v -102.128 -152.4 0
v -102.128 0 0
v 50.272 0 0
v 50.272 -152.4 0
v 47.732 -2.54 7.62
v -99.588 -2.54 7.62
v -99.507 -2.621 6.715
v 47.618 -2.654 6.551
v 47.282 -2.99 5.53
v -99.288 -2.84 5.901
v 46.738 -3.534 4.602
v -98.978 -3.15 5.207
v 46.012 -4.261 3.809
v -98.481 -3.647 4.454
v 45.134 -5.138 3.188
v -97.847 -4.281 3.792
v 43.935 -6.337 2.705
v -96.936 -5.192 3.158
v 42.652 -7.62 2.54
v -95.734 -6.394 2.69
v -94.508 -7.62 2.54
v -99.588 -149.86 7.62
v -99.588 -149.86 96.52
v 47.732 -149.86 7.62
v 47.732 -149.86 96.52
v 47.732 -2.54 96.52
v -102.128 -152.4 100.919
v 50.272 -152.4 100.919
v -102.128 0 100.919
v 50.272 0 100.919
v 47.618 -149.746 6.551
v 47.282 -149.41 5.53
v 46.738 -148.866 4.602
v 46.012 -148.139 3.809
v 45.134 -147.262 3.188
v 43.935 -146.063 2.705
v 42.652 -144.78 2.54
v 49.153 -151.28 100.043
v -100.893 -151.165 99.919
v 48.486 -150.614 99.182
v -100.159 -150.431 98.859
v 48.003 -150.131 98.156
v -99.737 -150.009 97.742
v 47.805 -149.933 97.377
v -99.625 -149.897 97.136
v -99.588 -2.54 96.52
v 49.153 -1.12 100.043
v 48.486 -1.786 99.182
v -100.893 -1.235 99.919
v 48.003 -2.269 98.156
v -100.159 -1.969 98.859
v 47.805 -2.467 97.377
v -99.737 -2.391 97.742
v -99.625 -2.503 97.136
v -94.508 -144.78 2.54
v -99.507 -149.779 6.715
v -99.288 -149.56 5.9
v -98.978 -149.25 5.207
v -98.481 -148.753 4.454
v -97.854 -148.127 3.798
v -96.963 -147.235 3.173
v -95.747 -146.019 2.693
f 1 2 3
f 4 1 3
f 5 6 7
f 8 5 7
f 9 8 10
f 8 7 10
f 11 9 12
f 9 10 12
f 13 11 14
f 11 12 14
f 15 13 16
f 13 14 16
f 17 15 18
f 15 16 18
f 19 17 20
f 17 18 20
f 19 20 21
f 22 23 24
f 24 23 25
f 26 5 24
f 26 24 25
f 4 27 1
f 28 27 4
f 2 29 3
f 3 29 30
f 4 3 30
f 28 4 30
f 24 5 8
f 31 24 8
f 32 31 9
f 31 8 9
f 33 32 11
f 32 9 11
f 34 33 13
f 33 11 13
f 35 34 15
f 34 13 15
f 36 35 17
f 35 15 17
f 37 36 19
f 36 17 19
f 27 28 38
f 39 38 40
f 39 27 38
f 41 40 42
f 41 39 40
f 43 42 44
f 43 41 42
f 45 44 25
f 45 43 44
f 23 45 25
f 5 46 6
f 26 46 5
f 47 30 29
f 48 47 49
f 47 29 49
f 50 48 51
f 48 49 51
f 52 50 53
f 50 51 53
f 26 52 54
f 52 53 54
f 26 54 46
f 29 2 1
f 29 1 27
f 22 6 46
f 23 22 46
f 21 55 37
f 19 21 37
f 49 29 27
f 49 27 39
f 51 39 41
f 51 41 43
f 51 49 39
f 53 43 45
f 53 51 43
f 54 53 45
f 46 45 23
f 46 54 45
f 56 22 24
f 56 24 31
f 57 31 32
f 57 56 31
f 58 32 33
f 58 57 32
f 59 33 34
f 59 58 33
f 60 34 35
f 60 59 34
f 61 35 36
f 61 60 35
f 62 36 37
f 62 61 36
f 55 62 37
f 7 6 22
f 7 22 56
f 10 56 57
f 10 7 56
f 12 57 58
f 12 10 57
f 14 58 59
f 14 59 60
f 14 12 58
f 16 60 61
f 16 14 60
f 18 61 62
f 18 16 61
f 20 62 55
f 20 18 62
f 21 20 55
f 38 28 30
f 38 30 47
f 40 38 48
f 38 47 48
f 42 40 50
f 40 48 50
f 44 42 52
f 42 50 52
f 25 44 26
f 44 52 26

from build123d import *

# Parameters (mm, degrees)
F0_W         = 152.4
F0_H         = 101.6
F1_DEPTH     = 152.4
F2_T         = -2.54
F3_T1_DEPTH  = 147.32
F3_T3_DEPTH  = 147.32
F3_T5_DEPTH  = 147.32
F3_T7_DEPTH  = 147.32
F3_T13_DEPTH = 160.02
F3_T19_DEPTH = 160.02
F3_T28_DEPTH = 160.02
F3_T34_DEPTH = 160.02
F3_T43_DEPTH = 160.02
F3_T49_DEPTH = 160.02
F3_T58_DEPTH = 160.02
F3_T64_DEPTH = 160.02


# Not quite as in the source:
# - a fillet or chamfer that OpenCascade refuses, or shapes differently, is made with other operations: its cross-section is extruded or revolved along the edge and cut away or added


with BuildPart() as f1:
    # F0 (on Front) → F1 (new body)
    with BuildSketch(Plane.XZ):
        with Locations((-25.9277992306, 50.8)):
            Rectangle(F0_W, F0_H)
    extrude(amount=F1_DEPTH)

    # F2
    f2_openings = [f1.faces().sort_by_distance(p)[0] for p in [
        (-25.927799, -76.2, 101.6),
    ]]
    offset(amount=F2_T, openings=f2_openings)

    # F3: fillet of radius 5.08 on 8 edges, made by hand

    # F3_s2 → F3_t1 (join)
    with BuildSketch(Plane.XZ.offset(2.54)):
        with BuildLine():
            ThreePointArc((47.7322007694, 7.62), (46.2443032178, 4.0278975516), (42.6522007694, 2.54))
            Line((42.6522007694, 2.54), (47.7322007694, 2.54))
            Line((47.7322007694, 2.54), (47.7322007694, 7.62))
        make_face()
        with BuildLine():
            ThreePointArc((-99.5877992306, 7.62), (-98.0999016791, 4.0278975516), (-94.5077992306, 2.54))
            Line((-94.5077992306, 2.54), (-99.5877992306, 2.54))
            Line((-99.5877992306, 2.54), (-99.5877992306, 7.62))
        make_face()
    extrude(amount=F3_T1_DEPTH)

    # F3_s4 → F3_t3 (join)
    with BuildSketch(Plane.YZ.offset(-99.5877992306)):
        with BuildLine():
            ThreePointArc((-2.54, 7.62), (-4.0278975516, 4.0278975516), (-7.62, 2.54))
            Line((-7.62, 2.54), (-2.54, 2.54))
            Line((-2.54, 2.54), (-2.54, 7.62))
        make_face()
        with BuildLine():
            ThreePointArc((-149.86, 7.62), (-148.3721024484, 4.0278975516), (-144.78, 2.54))
            Line((-144.78, 2.54), (-149.86, 2.54))
            Line((-149.86, 2.54), (-149.86, 7.62))
        make_face()
    extrude(amount=F3_T3_DEPTH)

    # F3_s6 → F3_t5 (cut)
    with BuildSketch(Plane.YZ.offset(-99.5877992306)):
        with BuildLine():
            ThreePointArc((2.54, 101.6), (-1.0521024484, 100.1121024484), (-2.54, 96.52))
            Line((-2.54, 96.52), (-2.54, 101.6))
            Line((-2.54, 101.6), (2.54, 101.6))
        make_face()
        with BuildLine():
            ThreePointArc((-154.94, 101.6), (-151.3478975516, 100.1121024484), (-149.86, 96.52))
            Line((-149.86, 96.52), (-149.86, 101.6))
            Line((-149.86, 101.6), (-154.94, 101.6))
        make_face()
    extrude(amount=F3_T5_DEPTH, mode=Mode.SUBTRACT)

    # F3_s8 → F3_t7 (cut)
    with BuildSketch(Plane.XZ.offset(2.54)):
        with BuildLine():
            ThreePointArc((52.8122007694, 101.6), (49.2200983209, 100.1121024484), (47.7322007694, 96.52))
            Line((47.7322007694, 96.52), (47.7322007694, 101.6))
            Line((47.7322007694, 101.6), (52.8122007694, 101.6))
        make_face()
        with BuildLine():
            ThreePointArc((-104.6677992306, 101.6), (-101.0756967822, 100.1121024484), (-99.5877992306, 96.52))
            Line((-99.5877992306, 96.52), (-99.5877992306, 101.6))
            Line((-99.5877992306, 101.6), (-104.6677992306, 101.6))
        make_face()
    extrude(amount=F3_T7_DEPTH, mode=Mode.SUBTRACT)


with BuildPart() as f3_tool11:
    # F3_s12 → F3_t13 (new body)
    with BuildSketch(Plane.XZ.offset(-10.16)):
        with BuildLine():
            ThreePointArc((52.8122007694, 101.6), (49.2200983209, 100.1121024484), (47.7322007694, 96.52))
            Line((47.7322007694, 96.52), (47.7322007694, 101.6))
            Line((47.7322007694, 101.6), (52.8122007694, 101.6))
        make_face()
    extrude(amount=F3_T13_DEPTH)

    split(bisect_by=Plane.XZ, keep=Keep.TOP)

    split(bisect_by=Plane.YZ.offset(50.2722007694), keep=Keep.BOTTOM)

    split(bisect_by=Plane.XZ.offset(2.54), keep=Keep.BOTTOM)


with BuildPart() as f3_tool17:
    # F3_s18 → F3_t19 (new body)
    with BuildSketch(Plane.YZ.offset(60.4322007694)):
        with BuildLine():
            ThreePointArc((2.54, 101.6), (-1.0521024484, 100.1121024484), (-2.54, 96.52))
            Line((-2.54, 96.52), (-2.54, 101.6))
            Line((-2.54, 101.6), (2.54, 101.6))
        make_face()
    extrude(amount=-F3_T19_DEPTH)

    split(bisect_by=Plane.XZ, keep=Keep.TOP)

    split(bisect_by=Plane.YZ.offset(50.2722007694), keep=Keep.BOTTOM)

    split(bisect_by=Plane.YZ.offset(47.7322007694), keep=Keep.TOP)


with BuildPart() as f3_tool11_1:
    add(f3_tool11.part)

    # F3_t23: intersect F3_tool17
    add(f3_tool17.part, mode=Mode.INTERSECT)


with BuildPart() as f1_1:
    add(f1.part)

    # F3_t9: cut F3_tool11
    add(f3_tool11_1.part, mode=Mode.SUBTRACT)


with BuildPart() as f3_tool26:
    # F3_s27 → F3_t28 (new body)
    with BuildSketch(Plane.YZ.offset(47.7322007694)):
        with BuildLine():
            ThreePointArc((2.54, 101.6), (-1.0521024484, 100.1121024484), (-2.54, 96.52))
            Line((-2.54, 96.52), (-2.54, 101.6))
            Line((-2.54, 101.6), (2.54, 101.6))
        make_face()
    extrude(amount=-F3_T28_DEPTH)

    split(bisect_by=Plane.YZ.offset(-102.1277992306), keep=Keep.TOP)

    split(bisect_by=Plane.XZ, keep=Keep.TOP)

    split(bisect_by=Plane.YZ.offset(-99.5877992306), keep=Keep.BOTTOM)


with BuildPart() as f3_tool32:
    # F3_s33 → F3_t34 (new body)
    with BuildSketch(Plane.XZ.offset(-10.16)):
        with BuildLine():
            ThreePointArc((-104.6677992306, 101.6), (-101.0756967822, 100.1121024484), (-99.5877992306, 96.52))
            Line((-99.5877992306, 96.52), (-99.5877992306, 101.6))
            Line((-99.5877992306, 101.6), (-104.6677992306, 101.6))
        make_face()
    extrude(amount=F3_T34_DEPTH)

    split(bisect_by=Plane.YZ.offset(-102.1277992306), keep=Keep.TOP)

    split(bisect_by=Plane.XZ, keep=Keep.TOP)

    split(bisect_by=Plane.XZ.offset(2.54), keep=Keep.BOTTOM)


with BuildPart() as f3_tool26_1:
    add(f3_tool26.part)

    # F3_t38: intersect F3_tool32
    add(f3_tool32.part, mode=Mode.INTERSECT)


with BuildPart() as f1_2:
    add(f1_1.part)

    # F3_t24: cut F3_tool26
    add(f3_tool26_1.part, mode=Mode.SUBTRACT)


with BuildPart() as f3_tool41:
    # F3_s42 → F3_t43 (new body)
    with BuildSketch(Plane.XZ.offset(2.54)):
        with BuildLine():
            ThreePointArc((52.8122007694, 101.6), (49.2200983209, 100.1121024484), (47.7322007694, 96.52))
            Line((47.7322007694, 96.52), (47.7322007694, 101.6))
            Line((47.7322007694, 101.6), (52.8122007694, 101.6))
        make_face()
    extrude(amount=F3_T43_DEPTH)

    split(bisect_by=Plane.XZ.offset(152.4), keep=Keep.BOTTOM)

    split(bisect_by=Plane.YZ.offset(50.2722007694), keep=Keep.BOTTOM)

    split(bisect_by=Plane.XZ.offset(149.86), keep=Keep.TOP)


with BuildPart() as f3_tool47:
    # F3_s48 → F3_t49 (new body)
    with BuildSketch(Plane.YZ.offset(60.4322007694)):
        with BuildLine():
            ThreePointArc((-154.94, 101.6), (-151.3478975516, 100.1121024484), (-149.86, 96.52))
            Line((-149.86, 96.52), (-149.86, 101.6))
            Line((-149.86, 101.6), (-154.94, 101.6))
        make_face()
    extrude(amount=-F3_T49_DEPTH)

    split(bisect_by=Plane.XZ.offset(152.4), keep=Keep.BOTTOM)

    split(bisect_by=Plane.YZ.offset(50.2722007694), keep=Keep.BOTTOM)

    split(bisect_by=Plane.YZ.offset(47.7322007694), keep=Keep.TOP)


with BuildPart() as f3_tool41_1:
    add(f3_tool41.part)

    # F3_t53: intersect F3_tool47
    add(f3_tool47.part, mode=Mode.INTERSECT)


with BuildPart() as f1_3:
    add(f1_2.part)

    # F3_t39: cut F3_tool41
    add(f3_tool41_1.part, mode=Mode.SUBTRACT)


with BuildPart() as f3_tool56:
    # F3_s57 → F3_t58 (new body)
    with BuildSketch(Plane.XZ.offset(2.54)):
        with BuildLine():
            ThreePointArc((-104.6677992306, 101.6), (-101.0756967822, 100.1121024484), (-99.5877992306, 96.52))
            Line((-99.5877992306, 96.52), (-99.5877992306, 101.6))
            Line((-99.5877992306, 101.6), (-104.6677992306, 101.6))
        make_face()
    extrude(amount=F3_T58_DEPTH)

    split(bisect_by=Plane.YZ.offset(-102.1277992306), keep=Keep.TOP)

    split(bisect_by=Plane.XZ.offset(152.4), keep=Keep.BOTTOM)

    split(bisect_by=Plane.XZ.offset(149.86), keep=Keep.TOP)


with BuildPart() as f3_tool62:
    # F3_s63 → F3_t64 (new body)
    with BuildSketch(Plane.YZ.offset(47.7322007694)):
        with BuildLine():
            ThreePointArc((-154.94, 101.6), (-151.3478975516, 100.1121024484), (-149.86, 96.52))
            Line((-149.86, 96.52), (-149.86, 101.6))
            Line((-149.86, 101.6), (-154.94, 101.6))
        make_face()
    extrude(amount=-F3_T64_DEPTH)

    split(bisect_by=Plane.YZ.offset(-102.1277992306), keep=Keep.TOP)

    split(bisect_by=Plane.XZ.offset(152.4), keep=Keep.BOTTOM)

    split(bisect_by=Plane.YZ.offset(-99.5877992306), keep=Keep.BOTTOM)


with BuildPart() as f3_tool56_1:
    add(f3_tool56.part)

    # F3_t68: intersect F3_tool62
    add(f3_tool62.part, mode=Mode.INTERSECT)


with BuildPart() as f1_4:
    add(f1_3.part)

    # F3_t54: cut F3_tool56
    add(f3_tool56_1.part, mode=Mode.SUBTRACT)


solid = f1_4.part
